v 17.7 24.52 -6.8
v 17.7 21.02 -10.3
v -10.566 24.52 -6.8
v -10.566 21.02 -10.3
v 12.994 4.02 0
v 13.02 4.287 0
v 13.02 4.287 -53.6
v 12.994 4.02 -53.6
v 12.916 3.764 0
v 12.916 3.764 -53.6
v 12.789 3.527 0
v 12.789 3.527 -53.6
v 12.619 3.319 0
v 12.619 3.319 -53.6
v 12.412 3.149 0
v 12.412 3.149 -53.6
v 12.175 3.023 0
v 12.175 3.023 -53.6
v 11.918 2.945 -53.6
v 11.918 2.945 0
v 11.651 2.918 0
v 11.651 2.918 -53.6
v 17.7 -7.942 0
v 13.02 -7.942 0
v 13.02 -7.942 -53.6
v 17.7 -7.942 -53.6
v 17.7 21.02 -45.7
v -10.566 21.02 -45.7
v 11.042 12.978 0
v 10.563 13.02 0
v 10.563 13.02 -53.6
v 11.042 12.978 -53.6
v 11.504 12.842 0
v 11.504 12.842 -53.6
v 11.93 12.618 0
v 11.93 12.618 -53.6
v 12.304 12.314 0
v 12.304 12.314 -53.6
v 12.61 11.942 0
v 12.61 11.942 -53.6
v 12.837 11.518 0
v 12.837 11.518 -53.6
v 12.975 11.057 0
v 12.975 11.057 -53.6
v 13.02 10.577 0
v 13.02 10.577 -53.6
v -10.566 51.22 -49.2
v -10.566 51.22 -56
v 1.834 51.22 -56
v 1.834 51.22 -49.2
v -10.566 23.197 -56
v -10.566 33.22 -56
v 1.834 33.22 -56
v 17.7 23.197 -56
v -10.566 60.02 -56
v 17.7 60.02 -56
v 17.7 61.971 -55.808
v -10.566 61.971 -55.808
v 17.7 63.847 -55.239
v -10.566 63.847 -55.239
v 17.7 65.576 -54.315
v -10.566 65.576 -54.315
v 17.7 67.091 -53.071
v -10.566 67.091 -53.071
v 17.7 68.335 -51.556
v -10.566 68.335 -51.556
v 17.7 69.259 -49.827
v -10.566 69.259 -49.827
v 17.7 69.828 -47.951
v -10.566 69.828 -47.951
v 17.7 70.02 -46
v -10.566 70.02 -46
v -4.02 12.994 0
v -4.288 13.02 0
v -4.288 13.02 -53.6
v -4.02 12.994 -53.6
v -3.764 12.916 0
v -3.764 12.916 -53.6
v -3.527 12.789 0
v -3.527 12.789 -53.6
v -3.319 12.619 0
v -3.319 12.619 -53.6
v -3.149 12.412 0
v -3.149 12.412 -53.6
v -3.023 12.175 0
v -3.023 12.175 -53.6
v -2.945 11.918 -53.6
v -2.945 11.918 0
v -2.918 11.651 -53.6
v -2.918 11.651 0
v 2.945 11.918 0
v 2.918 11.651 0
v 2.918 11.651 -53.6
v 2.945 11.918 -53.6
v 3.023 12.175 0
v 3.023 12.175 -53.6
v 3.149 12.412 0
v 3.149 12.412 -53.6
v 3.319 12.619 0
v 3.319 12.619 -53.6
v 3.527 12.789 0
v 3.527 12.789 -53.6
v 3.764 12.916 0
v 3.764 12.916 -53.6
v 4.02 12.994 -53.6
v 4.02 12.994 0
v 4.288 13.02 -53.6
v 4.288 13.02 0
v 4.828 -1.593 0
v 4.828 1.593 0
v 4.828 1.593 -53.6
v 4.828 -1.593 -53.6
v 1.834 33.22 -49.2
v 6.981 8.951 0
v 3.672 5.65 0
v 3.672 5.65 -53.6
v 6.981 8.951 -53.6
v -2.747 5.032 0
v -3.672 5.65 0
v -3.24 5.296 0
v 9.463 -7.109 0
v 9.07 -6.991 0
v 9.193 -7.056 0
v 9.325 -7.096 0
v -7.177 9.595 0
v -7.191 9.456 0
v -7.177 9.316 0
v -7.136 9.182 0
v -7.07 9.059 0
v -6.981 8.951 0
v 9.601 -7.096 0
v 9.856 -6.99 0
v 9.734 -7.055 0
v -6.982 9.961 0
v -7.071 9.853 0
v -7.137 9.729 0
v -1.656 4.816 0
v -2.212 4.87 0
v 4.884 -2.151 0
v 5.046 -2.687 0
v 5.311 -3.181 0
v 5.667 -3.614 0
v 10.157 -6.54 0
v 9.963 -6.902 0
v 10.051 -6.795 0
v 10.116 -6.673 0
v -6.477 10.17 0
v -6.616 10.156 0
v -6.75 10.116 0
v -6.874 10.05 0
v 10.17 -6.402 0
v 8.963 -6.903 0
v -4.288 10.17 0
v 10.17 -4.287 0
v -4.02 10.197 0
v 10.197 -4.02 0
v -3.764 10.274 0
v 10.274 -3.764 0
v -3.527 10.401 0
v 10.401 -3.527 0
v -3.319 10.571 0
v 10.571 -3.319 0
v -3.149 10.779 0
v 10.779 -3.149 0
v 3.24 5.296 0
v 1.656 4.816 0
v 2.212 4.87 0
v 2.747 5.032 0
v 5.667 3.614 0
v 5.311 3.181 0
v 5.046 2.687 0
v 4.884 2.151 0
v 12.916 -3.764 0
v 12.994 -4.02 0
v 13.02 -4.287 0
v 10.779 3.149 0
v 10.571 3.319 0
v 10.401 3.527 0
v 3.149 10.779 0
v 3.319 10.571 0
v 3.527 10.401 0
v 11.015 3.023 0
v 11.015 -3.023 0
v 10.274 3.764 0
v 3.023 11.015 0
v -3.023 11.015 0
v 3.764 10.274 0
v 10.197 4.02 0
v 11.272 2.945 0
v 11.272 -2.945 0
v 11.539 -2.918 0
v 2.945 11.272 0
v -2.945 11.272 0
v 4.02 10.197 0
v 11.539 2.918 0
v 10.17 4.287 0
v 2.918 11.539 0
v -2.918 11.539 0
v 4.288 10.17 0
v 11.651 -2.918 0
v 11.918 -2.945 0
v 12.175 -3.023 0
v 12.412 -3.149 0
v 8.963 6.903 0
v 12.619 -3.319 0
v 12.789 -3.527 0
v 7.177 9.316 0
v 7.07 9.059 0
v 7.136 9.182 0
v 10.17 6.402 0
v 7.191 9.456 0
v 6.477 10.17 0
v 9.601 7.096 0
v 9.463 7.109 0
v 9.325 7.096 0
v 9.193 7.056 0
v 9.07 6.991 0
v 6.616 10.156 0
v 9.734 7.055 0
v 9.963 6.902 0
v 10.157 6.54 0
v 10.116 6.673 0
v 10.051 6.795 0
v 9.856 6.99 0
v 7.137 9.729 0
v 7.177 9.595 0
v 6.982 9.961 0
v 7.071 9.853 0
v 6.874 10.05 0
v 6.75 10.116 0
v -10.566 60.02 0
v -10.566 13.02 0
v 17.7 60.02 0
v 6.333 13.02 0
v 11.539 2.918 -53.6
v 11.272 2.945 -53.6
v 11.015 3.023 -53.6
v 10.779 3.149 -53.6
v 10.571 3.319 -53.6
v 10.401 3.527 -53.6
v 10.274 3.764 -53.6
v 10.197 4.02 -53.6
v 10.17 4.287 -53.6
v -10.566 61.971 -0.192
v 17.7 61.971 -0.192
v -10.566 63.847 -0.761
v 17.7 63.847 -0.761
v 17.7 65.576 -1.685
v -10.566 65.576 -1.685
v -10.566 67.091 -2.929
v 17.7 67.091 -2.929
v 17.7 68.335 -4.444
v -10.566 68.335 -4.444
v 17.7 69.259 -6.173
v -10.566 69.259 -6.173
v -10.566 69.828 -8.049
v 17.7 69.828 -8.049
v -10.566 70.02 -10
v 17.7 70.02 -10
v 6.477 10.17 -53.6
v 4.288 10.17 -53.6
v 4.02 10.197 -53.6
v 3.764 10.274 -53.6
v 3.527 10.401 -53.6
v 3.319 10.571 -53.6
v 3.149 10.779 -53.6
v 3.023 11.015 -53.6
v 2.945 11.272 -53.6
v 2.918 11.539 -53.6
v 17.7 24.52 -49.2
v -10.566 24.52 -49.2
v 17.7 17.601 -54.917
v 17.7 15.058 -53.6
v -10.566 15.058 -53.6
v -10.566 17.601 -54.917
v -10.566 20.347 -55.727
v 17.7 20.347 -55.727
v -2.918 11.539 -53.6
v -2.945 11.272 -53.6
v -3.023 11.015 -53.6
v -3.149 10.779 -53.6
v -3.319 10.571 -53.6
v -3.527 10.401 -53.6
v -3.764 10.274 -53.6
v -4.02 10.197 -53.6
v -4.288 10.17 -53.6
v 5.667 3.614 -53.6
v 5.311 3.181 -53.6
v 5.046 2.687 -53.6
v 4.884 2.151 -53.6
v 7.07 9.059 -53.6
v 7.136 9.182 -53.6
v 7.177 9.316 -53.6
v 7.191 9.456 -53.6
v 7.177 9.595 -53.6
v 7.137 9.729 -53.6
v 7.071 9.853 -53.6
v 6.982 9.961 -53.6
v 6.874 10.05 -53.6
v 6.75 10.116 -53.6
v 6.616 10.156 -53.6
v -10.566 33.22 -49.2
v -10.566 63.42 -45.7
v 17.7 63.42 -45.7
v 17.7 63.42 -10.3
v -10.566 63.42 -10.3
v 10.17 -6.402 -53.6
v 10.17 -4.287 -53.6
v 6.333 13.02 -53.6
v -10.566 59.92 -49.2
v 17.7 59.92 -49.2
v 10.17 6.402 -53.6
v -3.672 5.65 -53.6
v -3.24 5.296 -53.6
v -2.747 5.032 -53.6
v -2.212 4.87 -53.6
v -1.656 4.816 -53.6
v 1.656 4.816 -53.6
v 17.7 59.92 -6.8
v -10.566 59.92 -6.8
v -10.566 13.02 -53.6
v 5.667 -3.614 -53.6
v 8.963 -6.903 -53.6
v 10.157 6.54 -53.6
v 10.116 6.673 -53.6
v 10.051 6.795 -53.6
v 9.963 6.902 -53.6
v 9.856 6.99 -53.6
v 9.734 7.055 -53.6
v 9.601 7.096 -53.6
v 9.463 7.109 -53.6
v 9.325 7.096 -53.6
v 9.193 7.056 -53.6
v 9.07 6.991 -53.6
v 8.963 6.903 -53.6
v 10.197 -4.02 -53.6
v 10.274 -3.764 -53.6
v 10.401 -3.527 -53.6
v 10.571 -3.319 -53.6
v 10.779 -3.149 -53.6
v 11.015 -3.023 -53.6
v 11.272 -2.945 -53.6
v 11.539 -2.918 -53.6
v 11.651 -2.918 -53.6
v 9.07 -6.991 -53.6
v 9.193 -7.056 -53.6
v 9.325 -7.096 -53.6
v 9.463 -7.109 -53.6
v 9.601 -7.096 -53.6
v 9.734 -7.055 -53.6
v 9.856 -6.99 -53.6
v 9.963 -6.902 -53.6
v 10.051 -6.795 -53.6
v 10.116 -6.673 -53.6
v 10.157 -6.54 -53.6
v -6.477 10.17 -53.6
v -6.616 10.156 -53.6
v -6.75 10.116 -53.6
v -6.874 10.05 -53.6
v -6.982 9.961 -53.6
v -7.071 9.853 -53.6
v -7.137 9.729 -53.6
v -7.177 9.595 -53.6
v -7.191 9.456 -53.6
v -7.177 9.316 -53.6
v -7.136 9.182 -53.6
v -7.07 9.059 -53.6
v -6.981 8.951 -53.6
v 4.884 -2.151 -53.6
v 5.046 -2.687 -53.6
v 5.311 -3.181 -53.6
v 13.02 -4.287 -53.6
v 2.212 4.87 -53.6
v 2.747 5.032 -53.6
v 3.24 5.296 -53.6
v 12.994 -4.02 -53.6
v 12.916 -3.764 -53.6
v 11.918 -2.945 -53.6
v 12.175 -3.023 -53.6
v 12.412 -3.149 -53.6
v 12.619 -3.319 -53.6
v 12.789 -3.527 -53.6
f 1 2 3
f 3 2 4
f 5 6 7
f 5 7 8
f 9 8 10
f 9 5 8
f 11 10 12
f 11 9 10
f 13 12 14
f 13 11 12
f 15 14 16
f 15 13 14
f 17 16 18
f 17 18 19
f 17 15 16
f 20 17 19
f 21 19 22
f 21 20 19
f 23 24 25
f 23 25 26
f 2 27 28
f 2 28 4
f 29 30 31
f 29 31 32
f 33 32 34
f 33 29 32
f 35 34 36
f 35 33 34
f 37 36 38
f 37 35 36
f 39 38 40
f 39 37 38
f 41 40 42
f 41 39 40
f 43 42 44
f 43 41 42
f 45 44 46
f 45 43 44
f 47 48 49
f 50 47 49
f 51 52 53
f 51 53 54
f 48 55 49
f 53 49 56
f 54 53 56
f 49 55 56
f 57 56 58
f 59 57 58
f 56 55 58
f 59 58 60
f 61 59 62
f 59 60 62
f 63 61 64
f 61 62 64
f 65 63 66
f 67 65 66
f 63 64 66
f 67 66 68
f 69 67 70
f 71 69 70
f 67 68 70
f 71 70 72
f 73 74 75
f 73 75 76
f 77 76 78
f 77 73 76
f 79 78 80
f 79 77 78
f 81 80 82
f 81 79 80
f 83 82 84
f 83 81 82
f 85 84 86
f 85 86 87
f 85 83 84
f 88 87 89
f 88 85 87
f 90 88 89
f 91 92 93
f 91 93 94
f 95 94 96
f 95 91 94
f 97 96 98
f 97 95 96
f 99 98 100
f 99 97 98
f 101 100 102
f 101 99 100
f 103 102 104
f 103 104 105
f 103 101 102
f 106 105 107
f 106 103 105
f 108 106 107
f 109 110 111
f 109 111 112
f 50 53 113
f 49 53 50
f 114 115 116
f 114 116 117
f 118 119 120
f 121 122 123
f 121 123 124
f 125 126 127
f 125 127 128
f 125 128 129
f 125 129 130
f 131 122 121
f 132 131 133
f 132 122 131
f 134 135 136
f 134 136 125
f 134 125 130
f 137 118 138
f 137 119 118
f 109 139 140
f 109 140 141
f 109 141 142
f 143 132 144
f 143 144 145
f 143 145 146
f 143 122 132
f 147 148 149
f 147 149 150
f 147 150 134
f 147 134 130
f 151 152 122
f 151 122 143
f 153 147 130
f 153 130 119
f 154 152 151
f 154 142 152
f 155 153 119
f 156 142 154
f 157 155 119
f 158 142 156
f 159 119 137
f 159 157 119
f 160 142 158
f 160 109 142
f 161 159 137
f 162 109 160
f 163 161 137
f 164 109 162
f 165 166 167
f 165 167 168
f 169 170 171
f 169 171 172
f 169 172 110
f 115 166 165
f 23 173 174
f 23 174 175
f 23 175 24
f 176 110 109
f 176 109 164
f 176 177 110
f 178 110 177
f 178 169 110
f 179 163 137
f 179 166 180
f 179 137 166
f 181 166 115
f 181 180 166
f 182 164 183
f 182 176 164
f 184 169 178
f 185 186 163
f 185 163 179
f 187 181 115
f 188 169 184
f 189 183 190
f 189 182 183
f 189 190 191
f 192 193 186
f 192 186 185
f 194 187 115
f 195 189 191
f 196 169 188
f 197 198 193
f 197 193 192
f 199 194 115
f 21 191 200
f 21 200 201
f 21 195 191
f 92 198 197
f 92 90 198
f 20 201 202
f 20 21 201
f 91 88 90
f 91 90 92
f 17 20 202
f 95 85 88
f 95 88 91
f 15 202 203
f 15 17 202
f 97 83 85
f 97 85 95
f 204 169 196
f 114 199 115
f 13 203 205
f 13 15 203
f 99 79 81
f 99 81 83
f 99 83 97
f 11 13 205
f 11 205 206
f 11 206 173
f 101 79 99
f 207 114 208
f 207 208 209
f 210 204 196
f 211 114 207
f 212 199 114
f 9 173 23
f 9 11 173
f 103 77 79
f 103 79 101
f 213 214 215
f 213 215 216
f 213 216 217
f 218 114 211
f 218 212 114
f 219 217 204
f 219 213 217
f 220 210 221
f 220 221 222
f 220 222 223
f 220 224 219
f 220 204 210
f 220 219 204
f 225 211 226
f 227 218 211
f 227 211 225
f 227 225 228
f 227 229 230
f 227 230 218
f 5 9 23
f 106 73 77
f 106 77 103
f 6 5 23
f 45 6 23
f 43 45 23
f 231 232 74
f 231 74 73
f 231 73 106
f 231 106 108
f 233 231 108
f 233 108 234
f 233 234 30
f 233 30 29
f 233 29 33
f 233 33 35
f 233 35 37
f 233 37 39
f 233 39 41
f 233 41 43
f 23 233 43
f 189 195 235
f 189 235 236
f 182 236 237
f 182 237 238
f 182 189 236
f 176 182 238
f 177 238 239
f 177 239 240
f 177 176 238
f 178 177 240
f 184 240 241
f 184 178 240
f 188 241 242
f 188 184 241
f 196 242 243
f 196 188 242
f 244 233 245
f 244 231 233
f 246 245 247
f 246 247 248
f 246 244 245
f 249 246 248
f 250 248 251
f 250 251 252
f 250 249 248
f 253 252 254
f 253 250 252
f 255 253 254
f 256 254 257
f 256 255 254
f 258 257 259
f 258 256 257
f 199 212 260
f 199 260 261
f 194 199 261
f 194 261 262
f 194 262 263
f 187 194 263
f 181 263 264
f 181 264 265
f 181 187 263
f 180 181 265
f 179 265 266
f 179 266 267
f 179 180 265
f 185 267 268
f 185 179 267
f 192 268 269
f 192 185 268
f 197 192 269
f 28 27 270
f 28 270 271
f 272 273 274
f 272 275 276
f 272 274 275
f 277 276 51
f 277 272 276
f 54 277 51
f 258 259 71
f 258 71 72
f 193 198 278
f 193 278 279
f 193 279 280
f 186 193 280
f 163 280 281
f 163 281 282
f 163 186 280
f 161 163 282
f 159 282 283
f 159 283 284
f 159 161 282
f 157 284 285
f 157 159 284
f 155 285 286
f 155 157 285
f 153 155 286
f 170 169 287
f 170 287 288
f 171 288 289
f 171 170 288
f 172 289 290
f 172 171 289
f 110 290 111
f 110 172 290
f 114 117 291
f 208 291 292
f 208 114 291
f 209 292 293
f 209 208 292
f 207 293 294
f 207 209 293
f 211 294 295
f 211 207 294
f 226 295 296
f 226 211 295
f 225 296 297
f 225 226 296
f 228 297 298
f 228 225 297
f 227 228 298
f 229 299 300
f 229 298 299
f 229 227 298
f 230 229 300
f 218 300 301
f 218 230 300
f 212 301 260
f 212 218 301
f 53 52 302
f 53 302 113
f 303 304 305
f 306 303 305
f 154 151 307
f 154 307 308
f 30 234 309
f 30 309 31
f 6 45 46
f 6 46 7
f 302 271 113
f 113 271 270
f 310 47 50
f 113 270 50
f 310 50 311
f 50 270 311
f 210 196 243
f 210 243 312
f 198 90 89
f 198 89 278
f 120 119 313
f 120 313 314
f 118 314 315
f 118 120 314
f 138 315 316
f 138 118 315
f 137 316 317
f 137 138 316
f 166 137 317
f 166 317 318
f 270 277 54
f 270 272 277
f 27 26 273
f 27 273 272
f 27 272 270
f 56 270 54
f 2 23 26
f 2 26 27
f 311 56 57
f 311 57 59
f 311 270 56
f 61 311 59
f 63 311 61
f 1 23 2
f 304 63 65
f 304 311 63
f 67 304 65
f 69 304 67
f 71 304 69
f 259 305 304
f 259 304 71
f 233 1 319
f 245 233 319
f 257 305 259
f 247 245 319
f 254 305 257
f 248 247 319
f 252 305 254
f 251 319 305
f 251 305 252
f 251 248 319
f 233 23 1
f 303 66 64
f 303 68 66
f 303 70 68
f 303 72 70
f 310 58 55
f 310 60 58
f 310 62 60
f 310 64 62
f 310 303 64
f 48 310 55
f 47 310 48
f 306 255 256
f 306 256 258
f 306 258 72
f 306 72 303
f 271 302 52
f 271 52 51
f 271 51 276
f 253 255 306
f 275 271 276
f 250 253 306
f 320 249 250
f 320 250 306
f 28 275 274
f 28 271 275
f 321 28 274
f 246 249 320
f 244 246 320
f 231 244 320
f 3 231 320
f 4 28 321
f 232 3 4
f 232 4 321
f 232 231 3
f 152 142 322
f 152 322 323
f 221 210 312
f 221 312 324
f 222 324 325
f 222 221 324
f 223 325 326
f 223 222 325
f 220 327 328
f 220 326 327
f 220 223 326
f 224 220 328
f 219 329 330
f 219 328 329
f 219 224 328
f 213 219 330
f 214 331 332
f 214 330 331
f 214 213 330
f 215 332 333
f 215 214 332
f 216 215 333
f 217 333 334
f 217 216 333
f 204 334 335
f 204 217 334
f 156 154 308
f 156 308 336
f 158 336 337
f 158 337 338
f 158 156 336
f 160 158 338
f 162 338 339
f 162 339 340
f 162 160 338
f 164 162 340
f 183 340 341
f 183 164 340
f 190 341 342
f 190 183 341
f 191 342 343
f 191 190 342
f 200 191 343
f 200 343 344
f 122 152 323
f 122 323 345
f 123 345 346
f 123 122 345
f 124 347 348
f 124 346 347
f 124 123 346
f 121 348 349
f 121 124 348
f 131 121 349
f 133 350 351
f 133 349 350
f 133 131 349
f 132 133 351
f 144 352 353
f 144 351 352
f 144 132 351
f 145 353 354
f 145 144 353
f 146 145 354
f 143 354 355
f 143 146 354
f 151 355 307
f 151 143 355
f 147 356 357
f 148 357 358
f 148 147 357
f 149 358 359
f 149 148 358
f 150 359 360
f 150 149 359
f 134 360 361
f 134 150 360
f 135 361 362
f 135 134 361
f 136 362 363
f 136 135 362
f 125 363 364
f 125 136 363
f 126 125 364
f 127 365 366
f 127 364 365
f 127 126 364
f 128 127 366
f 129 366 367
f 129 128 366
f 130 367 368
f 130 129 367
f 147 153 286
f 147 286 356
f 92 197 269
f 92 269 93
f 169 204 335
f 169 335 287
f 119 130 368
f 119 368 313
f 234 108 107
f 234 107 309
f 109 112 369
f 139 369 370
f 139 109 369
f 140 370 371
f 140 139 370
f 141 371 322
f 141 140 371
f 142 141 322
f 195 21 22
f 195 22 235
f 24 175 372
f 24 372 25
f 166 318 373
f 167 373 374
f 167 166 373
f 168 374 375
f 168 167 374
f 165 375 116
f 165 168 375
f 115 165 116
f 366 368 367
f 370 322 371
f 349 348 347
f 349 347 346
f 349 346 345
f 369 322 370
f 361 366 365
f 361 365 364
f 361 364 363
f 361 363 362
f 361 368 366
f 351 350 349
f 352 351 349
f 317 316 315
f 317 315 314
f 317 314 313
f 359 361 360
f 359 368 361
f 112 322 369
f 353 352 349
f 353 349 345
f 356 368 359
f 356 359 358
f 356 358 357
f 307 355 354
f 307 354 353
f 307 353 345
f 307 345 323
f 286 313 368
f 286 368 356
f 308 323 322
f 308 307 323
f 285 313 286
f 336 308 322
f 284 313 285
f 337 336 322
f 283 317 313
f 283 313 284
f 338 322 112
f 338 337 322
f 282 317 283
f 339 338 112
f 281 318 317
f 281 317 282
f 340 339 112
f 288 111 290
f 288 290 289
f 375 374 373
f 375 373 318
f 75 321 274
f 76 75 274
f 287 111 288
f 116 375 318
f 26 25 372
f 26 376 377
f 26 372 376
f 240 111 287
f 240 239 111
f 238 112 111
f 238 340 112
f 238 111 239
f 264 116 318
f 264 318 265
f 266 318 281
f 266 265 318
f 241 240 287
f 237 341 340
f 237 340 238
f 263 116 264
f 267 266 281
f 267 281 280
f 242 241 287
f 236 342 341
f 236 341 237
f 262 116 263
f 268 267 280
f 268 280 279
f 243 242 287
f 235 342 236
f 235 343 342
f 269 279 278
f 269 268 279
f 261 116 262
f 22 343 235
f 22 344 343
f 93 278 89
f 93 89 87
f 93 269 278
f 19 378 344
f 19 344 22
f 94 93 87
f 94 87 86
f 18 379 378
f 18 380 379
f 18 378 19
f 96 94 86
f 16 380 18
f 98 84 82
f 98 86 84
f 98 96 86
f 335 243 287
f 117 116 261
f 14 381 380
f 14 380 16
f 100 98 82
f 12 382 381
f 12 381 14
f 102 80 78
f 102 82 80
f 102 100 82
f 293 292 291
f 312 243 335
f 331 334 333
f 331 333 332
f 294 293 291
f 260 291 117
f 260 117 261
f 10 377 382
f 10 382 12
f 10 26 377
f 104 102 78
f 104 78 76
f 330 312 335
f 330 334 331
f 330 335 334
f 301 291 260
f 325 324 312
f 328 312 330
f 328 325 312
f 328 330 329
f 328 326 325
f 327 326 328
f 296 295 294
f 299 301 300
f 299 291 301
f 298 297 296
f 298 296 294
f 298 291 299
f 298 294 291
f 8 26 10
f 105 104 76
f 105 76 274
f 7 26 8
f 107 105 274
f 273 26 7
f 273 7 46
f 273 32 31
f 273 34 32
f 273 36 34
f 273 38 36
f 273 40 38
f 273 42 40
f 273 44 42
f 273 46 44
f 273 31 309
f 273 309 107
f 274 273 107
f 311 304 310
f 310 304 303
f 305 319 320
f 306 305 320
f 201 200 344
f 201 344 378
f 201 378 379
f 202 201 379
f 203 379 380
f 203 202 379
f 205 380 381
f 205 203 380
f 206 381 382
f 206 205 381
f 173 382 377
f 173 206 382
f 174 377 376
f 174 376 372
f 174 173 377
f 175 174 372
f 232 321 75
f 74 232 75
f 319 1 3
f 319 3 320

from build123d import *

# Parameters (mm, degrees)
BOSS_EXTRUDE1_DEPTH = 56
SKETCH14_W          = 42.4
SKETCH14_H          = 42.4
CUT_EXTRUDE1_DEPTH  = 56
CHAMFER1_SIZE       = 3.5
FILLET1_R           = 10
SKETCH16_W          = 2.4
SKETCH16_H          = 23
CUT_EXTRUDE3_DEPTH  = 95.009532523
CUT_EXTRUDE4_REACH  = 93.39
SKETCH17_W          = 15.453545708
SKETCH17_H          = 18
FILLET4_R           = 15
CUT_EXTRUDE5_DEPTH  = 92.389771857


with BuildPart() as part:
    # Sketch1 → Boss-Extrude1 (new body)
    with BuildSketch(Plane.XY):
        with BuildLine():
            Line((13.02, -7.9417418), (17.7, -7.9417418))
            Line((17.7, -7.9417418), (17.7, 70.02))
            Line((17.7, 70.02), (-10.566443095, 70.02))
            Line((-10.566443095, 70.02), (-10.566443095, 13.02))
            Line((-10.566443095, 13.02), (-5.317126718, 13.02))
            Line((-5.317126718, 13.02), (-4.287512407, 13.02))
            ThreePointArc((-4.287512407, 13.02), (-3.319474451, 12.619025549), (-2.9185, 11.650987593))
            Line((-2.9185, 11.650987593), (-2.9185, 11.539212407))
            ThreePointArc((-2.9185, 11.539212407), (-3.319474451, 10.571174451), (-4.287512407, 10.1702))
            Line((-4.287512407, 10.1702), (-6.476788598, 10.1702))
            ThreePointArc((-6.476788598, 10.1702), (-7.136510935, 9.729114651), (-6.981020848, 8.950903446))
            Line((-6.981020848, 8.950903446), (-3.672257405, 5.649701928))
            ThreePointArc((-3.672257405, 5.649701928), (-2.746830644, 5.032499411), (-1.655778399, 4.8158))
            Line((-1.655778399, 4.8158), (1.655778399, 4.8158))
            ThreePointArc((1.655778399, 4.8158), (2.746830644, 5.032499411), (3.672257405, 5.649701928))
            Line((3.672257405, 5.649701928), (6.981020848, 8.950903446))
            ThreePointArc((6.981020848, 8.950903446), (7.136510935, 9.729114651), (6.476788598, 10.1702))
            Line((6.476788598, 10.1702), (4.287512407, 10.1702))
            ThreePointArc((4.287512407, 10.1702), (3.319474451, 10.571174451), (2.9185, 11.539212407))
            Line((2.9185, 11.539212407), (2.9185, 11.650987593))
            ThreePointArc((2.9185, 11.650987593), (3.319474451, 12.619025549), (4.287512407, 13.02))
            Line((4.287512407, 13.02), (6.332886163, 13.02))
            Line((6.332886163, 13.02), (10.562594215, 13.019824354))
            ThreePointArc((10.562594215, 13.019824354), (12.303594776, 12.313982883), (13.019956614, 10.577284622))
            Line((13.019956614, 10.577284622), (13.02, 4.287469289))
            ThreePointArc((13.02, 4.287469289), (12.619025549, 3.319431332), (11.650987593, 2.918456882))
            Line((11.650987593, 2.918456882), (11.539212407, 2.918456882))
            ThreePointArc((11.539212407, 2.918456882), (10.571174451, 3.319431332), (10.1702, 4.287469289))
            Line((10.1702, 4.287469289), (10.1702, 6.402089023))
            ThreePointArc((10.1702, 6.402089023), (9.733877283, 7.055496588), (8.963146507, 6.90287605))
            Line((8.963146507, 6.90287605), (5.667020993, 3.614283579))
            ThreePointArc((5.667020993, 3.614283579), (5.046449321, 2.687255303), (4.8285, 1.593185507))
            Line((4.8285, 1.593185507), (4.8285, -1.593185507))
            ThreePointArc((4.8285, -1.593185507), (5.046449321, -2.687255303), (5.667020993, -3.614283579))
            Line((5.667020993, -3.614283579), (8.963146507, -6.90287605))
            ThreePointArc((8.963146507, -6.90287605), (9.733877283, -7.055496588), (10.1702, -6.402089023))
            Line((10.1702, -6.402089023), (10.1702, -4.287469289))
            ThreePointArc((10.1702, -4.287469289), (10.571174451, -3.319431332), (11.539212407, -2.918456882))
            Line((11.539212407, -2.918456882), (11.650987593, -2.918456882))
            ThreePointArc((11.650987593, -2.918456882), (12.619025549, -3.319431332), (13.02, -4.287469289))
            Line((13.02, -4.287469289), (13.02, -5.3170836))
            Line((13.02, -5.3170836), (13.02, -7.9417418))
        make_face()
    extrude(amount=BOSS_EXTRUDE1_DEPTH)

    # Sketch14 → Cut-Extrude1 (cut)
    with BuildSketch(Plane(origin=(17.7, 0, 0), x_dir=(0, 0, -1), z_dir=(1, 0, 0))):
        with Locations((-28, 42.22)):
            Rectangle(SKETCH14_W, SKETCH14_H)
    extrude(amount=-CUT_EXTRUDE1_DEPTH, mode=Mode.SUBTRACT)

    # Chamfer1
    chamfer1_edges = [part.edges().sort_by_distance(p)[0] for p in [
        (3.566778452, 21.02, 49.2),
        (3.566778452, 63.42, 49.2),
        (3.566778452, 63.42, 6.8),
        (3.566778452, 21.02, 6.8),
    ]]
    chamfer(chamfer1_edges, length=CHAMFER1_SIZE)

    # Fillet1
    fillet1_edges = [part.edges().sort_by_distance(p)[0] for p in [
        (3.566778452, 70.02, 56),
        (3.566778452, 70.02, 0),
    ]]
    fillet(fillet1_edges, radius=FILLET1_R)

    # Sketch16 → Cut-Extrude3 (cut, through all)
    with BuildSketch(Plane(origin=(17.7, 0, 0), x_dir=(0, 0, -1), z_dir=(1, 0, 0))):
        with Locations((-54.8, 3.5582582)):
            Rectangle(SKETCH16_W, SKETCH16_H)
    extrude(amount=-CUT_EXTRUDE3_DEPTH, mode=Mode.SUBTRACT)

    # Sketch17 → Cut-Extrude4 (cut, up to next)
    with BuildSketch(Plane.XY.offset(56), mode=Mode.PRIVATE) as cut_extrude4_sk1:
        with Locations((-5.893215949, 42.22)):
            Rectangle(SKETCH17_W, SKETCH17_H)
    cut_extrude4_tool1 = extrude(cut_extrude4_sk1.sketch, amount=-CUT_EXTRUDE4_REACH, mode=Mode.PRIVATE) & part.part
    add(cut_extrude4_tool1.solids().sort_by_distance((-5.893216, 42.22, 56))[0], mode=Mode.SUBTRACT)

    # Fillet4
    # the kernel refuses this fillet: 15 mm, written as the material it takes off along each edge
    with BuildSketch(Plane(origin=(38.046989949, 15.0582582, 56), x_dir=(0, 1, 0), z_dir=(-1, 0, 0))) as fillet4_piece_1:
        with BuildLine():
            CenterArc((8.13879598, 15), FILLET4_R, 237.140119621, 32.859880379)
            Line((0, 2.4), (-0.16277592, 2.148))
            ThreePointArc((-0.16277592, 2.148), (-0.3, 1.2), (-0.3, 0))
            Line((-0.3, 0), (0, -0.3))
            Line((0, -0.3), (8.13879598, -0.3))
            Line((8.13879598, -0.3), (8.13879598, 0))
        make_face()
    extrude(amount=68.960422994, mode=Mode.SUBTRACT)


with BuildPart() as body_2:
    # Mirror2: mirrored copy
    add(part.part.mirror(Plane(origin=(-4.287512407, 11.650987593, 0), x_dir=(1, 0, 0), z_dir=(0, 0, 1))))


with BuildPart() as part_1:
    add(part.part)

    # Sketch18 → Cut-Extrude5 (cut, through all)
    with BuildSketch(Plane(origin=(0, 0, 0), x_dir=(-1, 0, 0), z_dir=(0, 0, -1))):
        Polygon((-23.608513824, 16.914250509), (-37.368077548, 16.914250509), (-37.368077548, -12.201573967), (-23.608513824, -12.201573967), (16.391486176, -12.201573967), (16.391486176, 487.798426033), (-23.608513824, 487.798426033), align=None)
    extrude(amount=-CUT_EXTRUDE5_DEPTH, mode=Mode.SUBTRACT)


solid = body_2.part
